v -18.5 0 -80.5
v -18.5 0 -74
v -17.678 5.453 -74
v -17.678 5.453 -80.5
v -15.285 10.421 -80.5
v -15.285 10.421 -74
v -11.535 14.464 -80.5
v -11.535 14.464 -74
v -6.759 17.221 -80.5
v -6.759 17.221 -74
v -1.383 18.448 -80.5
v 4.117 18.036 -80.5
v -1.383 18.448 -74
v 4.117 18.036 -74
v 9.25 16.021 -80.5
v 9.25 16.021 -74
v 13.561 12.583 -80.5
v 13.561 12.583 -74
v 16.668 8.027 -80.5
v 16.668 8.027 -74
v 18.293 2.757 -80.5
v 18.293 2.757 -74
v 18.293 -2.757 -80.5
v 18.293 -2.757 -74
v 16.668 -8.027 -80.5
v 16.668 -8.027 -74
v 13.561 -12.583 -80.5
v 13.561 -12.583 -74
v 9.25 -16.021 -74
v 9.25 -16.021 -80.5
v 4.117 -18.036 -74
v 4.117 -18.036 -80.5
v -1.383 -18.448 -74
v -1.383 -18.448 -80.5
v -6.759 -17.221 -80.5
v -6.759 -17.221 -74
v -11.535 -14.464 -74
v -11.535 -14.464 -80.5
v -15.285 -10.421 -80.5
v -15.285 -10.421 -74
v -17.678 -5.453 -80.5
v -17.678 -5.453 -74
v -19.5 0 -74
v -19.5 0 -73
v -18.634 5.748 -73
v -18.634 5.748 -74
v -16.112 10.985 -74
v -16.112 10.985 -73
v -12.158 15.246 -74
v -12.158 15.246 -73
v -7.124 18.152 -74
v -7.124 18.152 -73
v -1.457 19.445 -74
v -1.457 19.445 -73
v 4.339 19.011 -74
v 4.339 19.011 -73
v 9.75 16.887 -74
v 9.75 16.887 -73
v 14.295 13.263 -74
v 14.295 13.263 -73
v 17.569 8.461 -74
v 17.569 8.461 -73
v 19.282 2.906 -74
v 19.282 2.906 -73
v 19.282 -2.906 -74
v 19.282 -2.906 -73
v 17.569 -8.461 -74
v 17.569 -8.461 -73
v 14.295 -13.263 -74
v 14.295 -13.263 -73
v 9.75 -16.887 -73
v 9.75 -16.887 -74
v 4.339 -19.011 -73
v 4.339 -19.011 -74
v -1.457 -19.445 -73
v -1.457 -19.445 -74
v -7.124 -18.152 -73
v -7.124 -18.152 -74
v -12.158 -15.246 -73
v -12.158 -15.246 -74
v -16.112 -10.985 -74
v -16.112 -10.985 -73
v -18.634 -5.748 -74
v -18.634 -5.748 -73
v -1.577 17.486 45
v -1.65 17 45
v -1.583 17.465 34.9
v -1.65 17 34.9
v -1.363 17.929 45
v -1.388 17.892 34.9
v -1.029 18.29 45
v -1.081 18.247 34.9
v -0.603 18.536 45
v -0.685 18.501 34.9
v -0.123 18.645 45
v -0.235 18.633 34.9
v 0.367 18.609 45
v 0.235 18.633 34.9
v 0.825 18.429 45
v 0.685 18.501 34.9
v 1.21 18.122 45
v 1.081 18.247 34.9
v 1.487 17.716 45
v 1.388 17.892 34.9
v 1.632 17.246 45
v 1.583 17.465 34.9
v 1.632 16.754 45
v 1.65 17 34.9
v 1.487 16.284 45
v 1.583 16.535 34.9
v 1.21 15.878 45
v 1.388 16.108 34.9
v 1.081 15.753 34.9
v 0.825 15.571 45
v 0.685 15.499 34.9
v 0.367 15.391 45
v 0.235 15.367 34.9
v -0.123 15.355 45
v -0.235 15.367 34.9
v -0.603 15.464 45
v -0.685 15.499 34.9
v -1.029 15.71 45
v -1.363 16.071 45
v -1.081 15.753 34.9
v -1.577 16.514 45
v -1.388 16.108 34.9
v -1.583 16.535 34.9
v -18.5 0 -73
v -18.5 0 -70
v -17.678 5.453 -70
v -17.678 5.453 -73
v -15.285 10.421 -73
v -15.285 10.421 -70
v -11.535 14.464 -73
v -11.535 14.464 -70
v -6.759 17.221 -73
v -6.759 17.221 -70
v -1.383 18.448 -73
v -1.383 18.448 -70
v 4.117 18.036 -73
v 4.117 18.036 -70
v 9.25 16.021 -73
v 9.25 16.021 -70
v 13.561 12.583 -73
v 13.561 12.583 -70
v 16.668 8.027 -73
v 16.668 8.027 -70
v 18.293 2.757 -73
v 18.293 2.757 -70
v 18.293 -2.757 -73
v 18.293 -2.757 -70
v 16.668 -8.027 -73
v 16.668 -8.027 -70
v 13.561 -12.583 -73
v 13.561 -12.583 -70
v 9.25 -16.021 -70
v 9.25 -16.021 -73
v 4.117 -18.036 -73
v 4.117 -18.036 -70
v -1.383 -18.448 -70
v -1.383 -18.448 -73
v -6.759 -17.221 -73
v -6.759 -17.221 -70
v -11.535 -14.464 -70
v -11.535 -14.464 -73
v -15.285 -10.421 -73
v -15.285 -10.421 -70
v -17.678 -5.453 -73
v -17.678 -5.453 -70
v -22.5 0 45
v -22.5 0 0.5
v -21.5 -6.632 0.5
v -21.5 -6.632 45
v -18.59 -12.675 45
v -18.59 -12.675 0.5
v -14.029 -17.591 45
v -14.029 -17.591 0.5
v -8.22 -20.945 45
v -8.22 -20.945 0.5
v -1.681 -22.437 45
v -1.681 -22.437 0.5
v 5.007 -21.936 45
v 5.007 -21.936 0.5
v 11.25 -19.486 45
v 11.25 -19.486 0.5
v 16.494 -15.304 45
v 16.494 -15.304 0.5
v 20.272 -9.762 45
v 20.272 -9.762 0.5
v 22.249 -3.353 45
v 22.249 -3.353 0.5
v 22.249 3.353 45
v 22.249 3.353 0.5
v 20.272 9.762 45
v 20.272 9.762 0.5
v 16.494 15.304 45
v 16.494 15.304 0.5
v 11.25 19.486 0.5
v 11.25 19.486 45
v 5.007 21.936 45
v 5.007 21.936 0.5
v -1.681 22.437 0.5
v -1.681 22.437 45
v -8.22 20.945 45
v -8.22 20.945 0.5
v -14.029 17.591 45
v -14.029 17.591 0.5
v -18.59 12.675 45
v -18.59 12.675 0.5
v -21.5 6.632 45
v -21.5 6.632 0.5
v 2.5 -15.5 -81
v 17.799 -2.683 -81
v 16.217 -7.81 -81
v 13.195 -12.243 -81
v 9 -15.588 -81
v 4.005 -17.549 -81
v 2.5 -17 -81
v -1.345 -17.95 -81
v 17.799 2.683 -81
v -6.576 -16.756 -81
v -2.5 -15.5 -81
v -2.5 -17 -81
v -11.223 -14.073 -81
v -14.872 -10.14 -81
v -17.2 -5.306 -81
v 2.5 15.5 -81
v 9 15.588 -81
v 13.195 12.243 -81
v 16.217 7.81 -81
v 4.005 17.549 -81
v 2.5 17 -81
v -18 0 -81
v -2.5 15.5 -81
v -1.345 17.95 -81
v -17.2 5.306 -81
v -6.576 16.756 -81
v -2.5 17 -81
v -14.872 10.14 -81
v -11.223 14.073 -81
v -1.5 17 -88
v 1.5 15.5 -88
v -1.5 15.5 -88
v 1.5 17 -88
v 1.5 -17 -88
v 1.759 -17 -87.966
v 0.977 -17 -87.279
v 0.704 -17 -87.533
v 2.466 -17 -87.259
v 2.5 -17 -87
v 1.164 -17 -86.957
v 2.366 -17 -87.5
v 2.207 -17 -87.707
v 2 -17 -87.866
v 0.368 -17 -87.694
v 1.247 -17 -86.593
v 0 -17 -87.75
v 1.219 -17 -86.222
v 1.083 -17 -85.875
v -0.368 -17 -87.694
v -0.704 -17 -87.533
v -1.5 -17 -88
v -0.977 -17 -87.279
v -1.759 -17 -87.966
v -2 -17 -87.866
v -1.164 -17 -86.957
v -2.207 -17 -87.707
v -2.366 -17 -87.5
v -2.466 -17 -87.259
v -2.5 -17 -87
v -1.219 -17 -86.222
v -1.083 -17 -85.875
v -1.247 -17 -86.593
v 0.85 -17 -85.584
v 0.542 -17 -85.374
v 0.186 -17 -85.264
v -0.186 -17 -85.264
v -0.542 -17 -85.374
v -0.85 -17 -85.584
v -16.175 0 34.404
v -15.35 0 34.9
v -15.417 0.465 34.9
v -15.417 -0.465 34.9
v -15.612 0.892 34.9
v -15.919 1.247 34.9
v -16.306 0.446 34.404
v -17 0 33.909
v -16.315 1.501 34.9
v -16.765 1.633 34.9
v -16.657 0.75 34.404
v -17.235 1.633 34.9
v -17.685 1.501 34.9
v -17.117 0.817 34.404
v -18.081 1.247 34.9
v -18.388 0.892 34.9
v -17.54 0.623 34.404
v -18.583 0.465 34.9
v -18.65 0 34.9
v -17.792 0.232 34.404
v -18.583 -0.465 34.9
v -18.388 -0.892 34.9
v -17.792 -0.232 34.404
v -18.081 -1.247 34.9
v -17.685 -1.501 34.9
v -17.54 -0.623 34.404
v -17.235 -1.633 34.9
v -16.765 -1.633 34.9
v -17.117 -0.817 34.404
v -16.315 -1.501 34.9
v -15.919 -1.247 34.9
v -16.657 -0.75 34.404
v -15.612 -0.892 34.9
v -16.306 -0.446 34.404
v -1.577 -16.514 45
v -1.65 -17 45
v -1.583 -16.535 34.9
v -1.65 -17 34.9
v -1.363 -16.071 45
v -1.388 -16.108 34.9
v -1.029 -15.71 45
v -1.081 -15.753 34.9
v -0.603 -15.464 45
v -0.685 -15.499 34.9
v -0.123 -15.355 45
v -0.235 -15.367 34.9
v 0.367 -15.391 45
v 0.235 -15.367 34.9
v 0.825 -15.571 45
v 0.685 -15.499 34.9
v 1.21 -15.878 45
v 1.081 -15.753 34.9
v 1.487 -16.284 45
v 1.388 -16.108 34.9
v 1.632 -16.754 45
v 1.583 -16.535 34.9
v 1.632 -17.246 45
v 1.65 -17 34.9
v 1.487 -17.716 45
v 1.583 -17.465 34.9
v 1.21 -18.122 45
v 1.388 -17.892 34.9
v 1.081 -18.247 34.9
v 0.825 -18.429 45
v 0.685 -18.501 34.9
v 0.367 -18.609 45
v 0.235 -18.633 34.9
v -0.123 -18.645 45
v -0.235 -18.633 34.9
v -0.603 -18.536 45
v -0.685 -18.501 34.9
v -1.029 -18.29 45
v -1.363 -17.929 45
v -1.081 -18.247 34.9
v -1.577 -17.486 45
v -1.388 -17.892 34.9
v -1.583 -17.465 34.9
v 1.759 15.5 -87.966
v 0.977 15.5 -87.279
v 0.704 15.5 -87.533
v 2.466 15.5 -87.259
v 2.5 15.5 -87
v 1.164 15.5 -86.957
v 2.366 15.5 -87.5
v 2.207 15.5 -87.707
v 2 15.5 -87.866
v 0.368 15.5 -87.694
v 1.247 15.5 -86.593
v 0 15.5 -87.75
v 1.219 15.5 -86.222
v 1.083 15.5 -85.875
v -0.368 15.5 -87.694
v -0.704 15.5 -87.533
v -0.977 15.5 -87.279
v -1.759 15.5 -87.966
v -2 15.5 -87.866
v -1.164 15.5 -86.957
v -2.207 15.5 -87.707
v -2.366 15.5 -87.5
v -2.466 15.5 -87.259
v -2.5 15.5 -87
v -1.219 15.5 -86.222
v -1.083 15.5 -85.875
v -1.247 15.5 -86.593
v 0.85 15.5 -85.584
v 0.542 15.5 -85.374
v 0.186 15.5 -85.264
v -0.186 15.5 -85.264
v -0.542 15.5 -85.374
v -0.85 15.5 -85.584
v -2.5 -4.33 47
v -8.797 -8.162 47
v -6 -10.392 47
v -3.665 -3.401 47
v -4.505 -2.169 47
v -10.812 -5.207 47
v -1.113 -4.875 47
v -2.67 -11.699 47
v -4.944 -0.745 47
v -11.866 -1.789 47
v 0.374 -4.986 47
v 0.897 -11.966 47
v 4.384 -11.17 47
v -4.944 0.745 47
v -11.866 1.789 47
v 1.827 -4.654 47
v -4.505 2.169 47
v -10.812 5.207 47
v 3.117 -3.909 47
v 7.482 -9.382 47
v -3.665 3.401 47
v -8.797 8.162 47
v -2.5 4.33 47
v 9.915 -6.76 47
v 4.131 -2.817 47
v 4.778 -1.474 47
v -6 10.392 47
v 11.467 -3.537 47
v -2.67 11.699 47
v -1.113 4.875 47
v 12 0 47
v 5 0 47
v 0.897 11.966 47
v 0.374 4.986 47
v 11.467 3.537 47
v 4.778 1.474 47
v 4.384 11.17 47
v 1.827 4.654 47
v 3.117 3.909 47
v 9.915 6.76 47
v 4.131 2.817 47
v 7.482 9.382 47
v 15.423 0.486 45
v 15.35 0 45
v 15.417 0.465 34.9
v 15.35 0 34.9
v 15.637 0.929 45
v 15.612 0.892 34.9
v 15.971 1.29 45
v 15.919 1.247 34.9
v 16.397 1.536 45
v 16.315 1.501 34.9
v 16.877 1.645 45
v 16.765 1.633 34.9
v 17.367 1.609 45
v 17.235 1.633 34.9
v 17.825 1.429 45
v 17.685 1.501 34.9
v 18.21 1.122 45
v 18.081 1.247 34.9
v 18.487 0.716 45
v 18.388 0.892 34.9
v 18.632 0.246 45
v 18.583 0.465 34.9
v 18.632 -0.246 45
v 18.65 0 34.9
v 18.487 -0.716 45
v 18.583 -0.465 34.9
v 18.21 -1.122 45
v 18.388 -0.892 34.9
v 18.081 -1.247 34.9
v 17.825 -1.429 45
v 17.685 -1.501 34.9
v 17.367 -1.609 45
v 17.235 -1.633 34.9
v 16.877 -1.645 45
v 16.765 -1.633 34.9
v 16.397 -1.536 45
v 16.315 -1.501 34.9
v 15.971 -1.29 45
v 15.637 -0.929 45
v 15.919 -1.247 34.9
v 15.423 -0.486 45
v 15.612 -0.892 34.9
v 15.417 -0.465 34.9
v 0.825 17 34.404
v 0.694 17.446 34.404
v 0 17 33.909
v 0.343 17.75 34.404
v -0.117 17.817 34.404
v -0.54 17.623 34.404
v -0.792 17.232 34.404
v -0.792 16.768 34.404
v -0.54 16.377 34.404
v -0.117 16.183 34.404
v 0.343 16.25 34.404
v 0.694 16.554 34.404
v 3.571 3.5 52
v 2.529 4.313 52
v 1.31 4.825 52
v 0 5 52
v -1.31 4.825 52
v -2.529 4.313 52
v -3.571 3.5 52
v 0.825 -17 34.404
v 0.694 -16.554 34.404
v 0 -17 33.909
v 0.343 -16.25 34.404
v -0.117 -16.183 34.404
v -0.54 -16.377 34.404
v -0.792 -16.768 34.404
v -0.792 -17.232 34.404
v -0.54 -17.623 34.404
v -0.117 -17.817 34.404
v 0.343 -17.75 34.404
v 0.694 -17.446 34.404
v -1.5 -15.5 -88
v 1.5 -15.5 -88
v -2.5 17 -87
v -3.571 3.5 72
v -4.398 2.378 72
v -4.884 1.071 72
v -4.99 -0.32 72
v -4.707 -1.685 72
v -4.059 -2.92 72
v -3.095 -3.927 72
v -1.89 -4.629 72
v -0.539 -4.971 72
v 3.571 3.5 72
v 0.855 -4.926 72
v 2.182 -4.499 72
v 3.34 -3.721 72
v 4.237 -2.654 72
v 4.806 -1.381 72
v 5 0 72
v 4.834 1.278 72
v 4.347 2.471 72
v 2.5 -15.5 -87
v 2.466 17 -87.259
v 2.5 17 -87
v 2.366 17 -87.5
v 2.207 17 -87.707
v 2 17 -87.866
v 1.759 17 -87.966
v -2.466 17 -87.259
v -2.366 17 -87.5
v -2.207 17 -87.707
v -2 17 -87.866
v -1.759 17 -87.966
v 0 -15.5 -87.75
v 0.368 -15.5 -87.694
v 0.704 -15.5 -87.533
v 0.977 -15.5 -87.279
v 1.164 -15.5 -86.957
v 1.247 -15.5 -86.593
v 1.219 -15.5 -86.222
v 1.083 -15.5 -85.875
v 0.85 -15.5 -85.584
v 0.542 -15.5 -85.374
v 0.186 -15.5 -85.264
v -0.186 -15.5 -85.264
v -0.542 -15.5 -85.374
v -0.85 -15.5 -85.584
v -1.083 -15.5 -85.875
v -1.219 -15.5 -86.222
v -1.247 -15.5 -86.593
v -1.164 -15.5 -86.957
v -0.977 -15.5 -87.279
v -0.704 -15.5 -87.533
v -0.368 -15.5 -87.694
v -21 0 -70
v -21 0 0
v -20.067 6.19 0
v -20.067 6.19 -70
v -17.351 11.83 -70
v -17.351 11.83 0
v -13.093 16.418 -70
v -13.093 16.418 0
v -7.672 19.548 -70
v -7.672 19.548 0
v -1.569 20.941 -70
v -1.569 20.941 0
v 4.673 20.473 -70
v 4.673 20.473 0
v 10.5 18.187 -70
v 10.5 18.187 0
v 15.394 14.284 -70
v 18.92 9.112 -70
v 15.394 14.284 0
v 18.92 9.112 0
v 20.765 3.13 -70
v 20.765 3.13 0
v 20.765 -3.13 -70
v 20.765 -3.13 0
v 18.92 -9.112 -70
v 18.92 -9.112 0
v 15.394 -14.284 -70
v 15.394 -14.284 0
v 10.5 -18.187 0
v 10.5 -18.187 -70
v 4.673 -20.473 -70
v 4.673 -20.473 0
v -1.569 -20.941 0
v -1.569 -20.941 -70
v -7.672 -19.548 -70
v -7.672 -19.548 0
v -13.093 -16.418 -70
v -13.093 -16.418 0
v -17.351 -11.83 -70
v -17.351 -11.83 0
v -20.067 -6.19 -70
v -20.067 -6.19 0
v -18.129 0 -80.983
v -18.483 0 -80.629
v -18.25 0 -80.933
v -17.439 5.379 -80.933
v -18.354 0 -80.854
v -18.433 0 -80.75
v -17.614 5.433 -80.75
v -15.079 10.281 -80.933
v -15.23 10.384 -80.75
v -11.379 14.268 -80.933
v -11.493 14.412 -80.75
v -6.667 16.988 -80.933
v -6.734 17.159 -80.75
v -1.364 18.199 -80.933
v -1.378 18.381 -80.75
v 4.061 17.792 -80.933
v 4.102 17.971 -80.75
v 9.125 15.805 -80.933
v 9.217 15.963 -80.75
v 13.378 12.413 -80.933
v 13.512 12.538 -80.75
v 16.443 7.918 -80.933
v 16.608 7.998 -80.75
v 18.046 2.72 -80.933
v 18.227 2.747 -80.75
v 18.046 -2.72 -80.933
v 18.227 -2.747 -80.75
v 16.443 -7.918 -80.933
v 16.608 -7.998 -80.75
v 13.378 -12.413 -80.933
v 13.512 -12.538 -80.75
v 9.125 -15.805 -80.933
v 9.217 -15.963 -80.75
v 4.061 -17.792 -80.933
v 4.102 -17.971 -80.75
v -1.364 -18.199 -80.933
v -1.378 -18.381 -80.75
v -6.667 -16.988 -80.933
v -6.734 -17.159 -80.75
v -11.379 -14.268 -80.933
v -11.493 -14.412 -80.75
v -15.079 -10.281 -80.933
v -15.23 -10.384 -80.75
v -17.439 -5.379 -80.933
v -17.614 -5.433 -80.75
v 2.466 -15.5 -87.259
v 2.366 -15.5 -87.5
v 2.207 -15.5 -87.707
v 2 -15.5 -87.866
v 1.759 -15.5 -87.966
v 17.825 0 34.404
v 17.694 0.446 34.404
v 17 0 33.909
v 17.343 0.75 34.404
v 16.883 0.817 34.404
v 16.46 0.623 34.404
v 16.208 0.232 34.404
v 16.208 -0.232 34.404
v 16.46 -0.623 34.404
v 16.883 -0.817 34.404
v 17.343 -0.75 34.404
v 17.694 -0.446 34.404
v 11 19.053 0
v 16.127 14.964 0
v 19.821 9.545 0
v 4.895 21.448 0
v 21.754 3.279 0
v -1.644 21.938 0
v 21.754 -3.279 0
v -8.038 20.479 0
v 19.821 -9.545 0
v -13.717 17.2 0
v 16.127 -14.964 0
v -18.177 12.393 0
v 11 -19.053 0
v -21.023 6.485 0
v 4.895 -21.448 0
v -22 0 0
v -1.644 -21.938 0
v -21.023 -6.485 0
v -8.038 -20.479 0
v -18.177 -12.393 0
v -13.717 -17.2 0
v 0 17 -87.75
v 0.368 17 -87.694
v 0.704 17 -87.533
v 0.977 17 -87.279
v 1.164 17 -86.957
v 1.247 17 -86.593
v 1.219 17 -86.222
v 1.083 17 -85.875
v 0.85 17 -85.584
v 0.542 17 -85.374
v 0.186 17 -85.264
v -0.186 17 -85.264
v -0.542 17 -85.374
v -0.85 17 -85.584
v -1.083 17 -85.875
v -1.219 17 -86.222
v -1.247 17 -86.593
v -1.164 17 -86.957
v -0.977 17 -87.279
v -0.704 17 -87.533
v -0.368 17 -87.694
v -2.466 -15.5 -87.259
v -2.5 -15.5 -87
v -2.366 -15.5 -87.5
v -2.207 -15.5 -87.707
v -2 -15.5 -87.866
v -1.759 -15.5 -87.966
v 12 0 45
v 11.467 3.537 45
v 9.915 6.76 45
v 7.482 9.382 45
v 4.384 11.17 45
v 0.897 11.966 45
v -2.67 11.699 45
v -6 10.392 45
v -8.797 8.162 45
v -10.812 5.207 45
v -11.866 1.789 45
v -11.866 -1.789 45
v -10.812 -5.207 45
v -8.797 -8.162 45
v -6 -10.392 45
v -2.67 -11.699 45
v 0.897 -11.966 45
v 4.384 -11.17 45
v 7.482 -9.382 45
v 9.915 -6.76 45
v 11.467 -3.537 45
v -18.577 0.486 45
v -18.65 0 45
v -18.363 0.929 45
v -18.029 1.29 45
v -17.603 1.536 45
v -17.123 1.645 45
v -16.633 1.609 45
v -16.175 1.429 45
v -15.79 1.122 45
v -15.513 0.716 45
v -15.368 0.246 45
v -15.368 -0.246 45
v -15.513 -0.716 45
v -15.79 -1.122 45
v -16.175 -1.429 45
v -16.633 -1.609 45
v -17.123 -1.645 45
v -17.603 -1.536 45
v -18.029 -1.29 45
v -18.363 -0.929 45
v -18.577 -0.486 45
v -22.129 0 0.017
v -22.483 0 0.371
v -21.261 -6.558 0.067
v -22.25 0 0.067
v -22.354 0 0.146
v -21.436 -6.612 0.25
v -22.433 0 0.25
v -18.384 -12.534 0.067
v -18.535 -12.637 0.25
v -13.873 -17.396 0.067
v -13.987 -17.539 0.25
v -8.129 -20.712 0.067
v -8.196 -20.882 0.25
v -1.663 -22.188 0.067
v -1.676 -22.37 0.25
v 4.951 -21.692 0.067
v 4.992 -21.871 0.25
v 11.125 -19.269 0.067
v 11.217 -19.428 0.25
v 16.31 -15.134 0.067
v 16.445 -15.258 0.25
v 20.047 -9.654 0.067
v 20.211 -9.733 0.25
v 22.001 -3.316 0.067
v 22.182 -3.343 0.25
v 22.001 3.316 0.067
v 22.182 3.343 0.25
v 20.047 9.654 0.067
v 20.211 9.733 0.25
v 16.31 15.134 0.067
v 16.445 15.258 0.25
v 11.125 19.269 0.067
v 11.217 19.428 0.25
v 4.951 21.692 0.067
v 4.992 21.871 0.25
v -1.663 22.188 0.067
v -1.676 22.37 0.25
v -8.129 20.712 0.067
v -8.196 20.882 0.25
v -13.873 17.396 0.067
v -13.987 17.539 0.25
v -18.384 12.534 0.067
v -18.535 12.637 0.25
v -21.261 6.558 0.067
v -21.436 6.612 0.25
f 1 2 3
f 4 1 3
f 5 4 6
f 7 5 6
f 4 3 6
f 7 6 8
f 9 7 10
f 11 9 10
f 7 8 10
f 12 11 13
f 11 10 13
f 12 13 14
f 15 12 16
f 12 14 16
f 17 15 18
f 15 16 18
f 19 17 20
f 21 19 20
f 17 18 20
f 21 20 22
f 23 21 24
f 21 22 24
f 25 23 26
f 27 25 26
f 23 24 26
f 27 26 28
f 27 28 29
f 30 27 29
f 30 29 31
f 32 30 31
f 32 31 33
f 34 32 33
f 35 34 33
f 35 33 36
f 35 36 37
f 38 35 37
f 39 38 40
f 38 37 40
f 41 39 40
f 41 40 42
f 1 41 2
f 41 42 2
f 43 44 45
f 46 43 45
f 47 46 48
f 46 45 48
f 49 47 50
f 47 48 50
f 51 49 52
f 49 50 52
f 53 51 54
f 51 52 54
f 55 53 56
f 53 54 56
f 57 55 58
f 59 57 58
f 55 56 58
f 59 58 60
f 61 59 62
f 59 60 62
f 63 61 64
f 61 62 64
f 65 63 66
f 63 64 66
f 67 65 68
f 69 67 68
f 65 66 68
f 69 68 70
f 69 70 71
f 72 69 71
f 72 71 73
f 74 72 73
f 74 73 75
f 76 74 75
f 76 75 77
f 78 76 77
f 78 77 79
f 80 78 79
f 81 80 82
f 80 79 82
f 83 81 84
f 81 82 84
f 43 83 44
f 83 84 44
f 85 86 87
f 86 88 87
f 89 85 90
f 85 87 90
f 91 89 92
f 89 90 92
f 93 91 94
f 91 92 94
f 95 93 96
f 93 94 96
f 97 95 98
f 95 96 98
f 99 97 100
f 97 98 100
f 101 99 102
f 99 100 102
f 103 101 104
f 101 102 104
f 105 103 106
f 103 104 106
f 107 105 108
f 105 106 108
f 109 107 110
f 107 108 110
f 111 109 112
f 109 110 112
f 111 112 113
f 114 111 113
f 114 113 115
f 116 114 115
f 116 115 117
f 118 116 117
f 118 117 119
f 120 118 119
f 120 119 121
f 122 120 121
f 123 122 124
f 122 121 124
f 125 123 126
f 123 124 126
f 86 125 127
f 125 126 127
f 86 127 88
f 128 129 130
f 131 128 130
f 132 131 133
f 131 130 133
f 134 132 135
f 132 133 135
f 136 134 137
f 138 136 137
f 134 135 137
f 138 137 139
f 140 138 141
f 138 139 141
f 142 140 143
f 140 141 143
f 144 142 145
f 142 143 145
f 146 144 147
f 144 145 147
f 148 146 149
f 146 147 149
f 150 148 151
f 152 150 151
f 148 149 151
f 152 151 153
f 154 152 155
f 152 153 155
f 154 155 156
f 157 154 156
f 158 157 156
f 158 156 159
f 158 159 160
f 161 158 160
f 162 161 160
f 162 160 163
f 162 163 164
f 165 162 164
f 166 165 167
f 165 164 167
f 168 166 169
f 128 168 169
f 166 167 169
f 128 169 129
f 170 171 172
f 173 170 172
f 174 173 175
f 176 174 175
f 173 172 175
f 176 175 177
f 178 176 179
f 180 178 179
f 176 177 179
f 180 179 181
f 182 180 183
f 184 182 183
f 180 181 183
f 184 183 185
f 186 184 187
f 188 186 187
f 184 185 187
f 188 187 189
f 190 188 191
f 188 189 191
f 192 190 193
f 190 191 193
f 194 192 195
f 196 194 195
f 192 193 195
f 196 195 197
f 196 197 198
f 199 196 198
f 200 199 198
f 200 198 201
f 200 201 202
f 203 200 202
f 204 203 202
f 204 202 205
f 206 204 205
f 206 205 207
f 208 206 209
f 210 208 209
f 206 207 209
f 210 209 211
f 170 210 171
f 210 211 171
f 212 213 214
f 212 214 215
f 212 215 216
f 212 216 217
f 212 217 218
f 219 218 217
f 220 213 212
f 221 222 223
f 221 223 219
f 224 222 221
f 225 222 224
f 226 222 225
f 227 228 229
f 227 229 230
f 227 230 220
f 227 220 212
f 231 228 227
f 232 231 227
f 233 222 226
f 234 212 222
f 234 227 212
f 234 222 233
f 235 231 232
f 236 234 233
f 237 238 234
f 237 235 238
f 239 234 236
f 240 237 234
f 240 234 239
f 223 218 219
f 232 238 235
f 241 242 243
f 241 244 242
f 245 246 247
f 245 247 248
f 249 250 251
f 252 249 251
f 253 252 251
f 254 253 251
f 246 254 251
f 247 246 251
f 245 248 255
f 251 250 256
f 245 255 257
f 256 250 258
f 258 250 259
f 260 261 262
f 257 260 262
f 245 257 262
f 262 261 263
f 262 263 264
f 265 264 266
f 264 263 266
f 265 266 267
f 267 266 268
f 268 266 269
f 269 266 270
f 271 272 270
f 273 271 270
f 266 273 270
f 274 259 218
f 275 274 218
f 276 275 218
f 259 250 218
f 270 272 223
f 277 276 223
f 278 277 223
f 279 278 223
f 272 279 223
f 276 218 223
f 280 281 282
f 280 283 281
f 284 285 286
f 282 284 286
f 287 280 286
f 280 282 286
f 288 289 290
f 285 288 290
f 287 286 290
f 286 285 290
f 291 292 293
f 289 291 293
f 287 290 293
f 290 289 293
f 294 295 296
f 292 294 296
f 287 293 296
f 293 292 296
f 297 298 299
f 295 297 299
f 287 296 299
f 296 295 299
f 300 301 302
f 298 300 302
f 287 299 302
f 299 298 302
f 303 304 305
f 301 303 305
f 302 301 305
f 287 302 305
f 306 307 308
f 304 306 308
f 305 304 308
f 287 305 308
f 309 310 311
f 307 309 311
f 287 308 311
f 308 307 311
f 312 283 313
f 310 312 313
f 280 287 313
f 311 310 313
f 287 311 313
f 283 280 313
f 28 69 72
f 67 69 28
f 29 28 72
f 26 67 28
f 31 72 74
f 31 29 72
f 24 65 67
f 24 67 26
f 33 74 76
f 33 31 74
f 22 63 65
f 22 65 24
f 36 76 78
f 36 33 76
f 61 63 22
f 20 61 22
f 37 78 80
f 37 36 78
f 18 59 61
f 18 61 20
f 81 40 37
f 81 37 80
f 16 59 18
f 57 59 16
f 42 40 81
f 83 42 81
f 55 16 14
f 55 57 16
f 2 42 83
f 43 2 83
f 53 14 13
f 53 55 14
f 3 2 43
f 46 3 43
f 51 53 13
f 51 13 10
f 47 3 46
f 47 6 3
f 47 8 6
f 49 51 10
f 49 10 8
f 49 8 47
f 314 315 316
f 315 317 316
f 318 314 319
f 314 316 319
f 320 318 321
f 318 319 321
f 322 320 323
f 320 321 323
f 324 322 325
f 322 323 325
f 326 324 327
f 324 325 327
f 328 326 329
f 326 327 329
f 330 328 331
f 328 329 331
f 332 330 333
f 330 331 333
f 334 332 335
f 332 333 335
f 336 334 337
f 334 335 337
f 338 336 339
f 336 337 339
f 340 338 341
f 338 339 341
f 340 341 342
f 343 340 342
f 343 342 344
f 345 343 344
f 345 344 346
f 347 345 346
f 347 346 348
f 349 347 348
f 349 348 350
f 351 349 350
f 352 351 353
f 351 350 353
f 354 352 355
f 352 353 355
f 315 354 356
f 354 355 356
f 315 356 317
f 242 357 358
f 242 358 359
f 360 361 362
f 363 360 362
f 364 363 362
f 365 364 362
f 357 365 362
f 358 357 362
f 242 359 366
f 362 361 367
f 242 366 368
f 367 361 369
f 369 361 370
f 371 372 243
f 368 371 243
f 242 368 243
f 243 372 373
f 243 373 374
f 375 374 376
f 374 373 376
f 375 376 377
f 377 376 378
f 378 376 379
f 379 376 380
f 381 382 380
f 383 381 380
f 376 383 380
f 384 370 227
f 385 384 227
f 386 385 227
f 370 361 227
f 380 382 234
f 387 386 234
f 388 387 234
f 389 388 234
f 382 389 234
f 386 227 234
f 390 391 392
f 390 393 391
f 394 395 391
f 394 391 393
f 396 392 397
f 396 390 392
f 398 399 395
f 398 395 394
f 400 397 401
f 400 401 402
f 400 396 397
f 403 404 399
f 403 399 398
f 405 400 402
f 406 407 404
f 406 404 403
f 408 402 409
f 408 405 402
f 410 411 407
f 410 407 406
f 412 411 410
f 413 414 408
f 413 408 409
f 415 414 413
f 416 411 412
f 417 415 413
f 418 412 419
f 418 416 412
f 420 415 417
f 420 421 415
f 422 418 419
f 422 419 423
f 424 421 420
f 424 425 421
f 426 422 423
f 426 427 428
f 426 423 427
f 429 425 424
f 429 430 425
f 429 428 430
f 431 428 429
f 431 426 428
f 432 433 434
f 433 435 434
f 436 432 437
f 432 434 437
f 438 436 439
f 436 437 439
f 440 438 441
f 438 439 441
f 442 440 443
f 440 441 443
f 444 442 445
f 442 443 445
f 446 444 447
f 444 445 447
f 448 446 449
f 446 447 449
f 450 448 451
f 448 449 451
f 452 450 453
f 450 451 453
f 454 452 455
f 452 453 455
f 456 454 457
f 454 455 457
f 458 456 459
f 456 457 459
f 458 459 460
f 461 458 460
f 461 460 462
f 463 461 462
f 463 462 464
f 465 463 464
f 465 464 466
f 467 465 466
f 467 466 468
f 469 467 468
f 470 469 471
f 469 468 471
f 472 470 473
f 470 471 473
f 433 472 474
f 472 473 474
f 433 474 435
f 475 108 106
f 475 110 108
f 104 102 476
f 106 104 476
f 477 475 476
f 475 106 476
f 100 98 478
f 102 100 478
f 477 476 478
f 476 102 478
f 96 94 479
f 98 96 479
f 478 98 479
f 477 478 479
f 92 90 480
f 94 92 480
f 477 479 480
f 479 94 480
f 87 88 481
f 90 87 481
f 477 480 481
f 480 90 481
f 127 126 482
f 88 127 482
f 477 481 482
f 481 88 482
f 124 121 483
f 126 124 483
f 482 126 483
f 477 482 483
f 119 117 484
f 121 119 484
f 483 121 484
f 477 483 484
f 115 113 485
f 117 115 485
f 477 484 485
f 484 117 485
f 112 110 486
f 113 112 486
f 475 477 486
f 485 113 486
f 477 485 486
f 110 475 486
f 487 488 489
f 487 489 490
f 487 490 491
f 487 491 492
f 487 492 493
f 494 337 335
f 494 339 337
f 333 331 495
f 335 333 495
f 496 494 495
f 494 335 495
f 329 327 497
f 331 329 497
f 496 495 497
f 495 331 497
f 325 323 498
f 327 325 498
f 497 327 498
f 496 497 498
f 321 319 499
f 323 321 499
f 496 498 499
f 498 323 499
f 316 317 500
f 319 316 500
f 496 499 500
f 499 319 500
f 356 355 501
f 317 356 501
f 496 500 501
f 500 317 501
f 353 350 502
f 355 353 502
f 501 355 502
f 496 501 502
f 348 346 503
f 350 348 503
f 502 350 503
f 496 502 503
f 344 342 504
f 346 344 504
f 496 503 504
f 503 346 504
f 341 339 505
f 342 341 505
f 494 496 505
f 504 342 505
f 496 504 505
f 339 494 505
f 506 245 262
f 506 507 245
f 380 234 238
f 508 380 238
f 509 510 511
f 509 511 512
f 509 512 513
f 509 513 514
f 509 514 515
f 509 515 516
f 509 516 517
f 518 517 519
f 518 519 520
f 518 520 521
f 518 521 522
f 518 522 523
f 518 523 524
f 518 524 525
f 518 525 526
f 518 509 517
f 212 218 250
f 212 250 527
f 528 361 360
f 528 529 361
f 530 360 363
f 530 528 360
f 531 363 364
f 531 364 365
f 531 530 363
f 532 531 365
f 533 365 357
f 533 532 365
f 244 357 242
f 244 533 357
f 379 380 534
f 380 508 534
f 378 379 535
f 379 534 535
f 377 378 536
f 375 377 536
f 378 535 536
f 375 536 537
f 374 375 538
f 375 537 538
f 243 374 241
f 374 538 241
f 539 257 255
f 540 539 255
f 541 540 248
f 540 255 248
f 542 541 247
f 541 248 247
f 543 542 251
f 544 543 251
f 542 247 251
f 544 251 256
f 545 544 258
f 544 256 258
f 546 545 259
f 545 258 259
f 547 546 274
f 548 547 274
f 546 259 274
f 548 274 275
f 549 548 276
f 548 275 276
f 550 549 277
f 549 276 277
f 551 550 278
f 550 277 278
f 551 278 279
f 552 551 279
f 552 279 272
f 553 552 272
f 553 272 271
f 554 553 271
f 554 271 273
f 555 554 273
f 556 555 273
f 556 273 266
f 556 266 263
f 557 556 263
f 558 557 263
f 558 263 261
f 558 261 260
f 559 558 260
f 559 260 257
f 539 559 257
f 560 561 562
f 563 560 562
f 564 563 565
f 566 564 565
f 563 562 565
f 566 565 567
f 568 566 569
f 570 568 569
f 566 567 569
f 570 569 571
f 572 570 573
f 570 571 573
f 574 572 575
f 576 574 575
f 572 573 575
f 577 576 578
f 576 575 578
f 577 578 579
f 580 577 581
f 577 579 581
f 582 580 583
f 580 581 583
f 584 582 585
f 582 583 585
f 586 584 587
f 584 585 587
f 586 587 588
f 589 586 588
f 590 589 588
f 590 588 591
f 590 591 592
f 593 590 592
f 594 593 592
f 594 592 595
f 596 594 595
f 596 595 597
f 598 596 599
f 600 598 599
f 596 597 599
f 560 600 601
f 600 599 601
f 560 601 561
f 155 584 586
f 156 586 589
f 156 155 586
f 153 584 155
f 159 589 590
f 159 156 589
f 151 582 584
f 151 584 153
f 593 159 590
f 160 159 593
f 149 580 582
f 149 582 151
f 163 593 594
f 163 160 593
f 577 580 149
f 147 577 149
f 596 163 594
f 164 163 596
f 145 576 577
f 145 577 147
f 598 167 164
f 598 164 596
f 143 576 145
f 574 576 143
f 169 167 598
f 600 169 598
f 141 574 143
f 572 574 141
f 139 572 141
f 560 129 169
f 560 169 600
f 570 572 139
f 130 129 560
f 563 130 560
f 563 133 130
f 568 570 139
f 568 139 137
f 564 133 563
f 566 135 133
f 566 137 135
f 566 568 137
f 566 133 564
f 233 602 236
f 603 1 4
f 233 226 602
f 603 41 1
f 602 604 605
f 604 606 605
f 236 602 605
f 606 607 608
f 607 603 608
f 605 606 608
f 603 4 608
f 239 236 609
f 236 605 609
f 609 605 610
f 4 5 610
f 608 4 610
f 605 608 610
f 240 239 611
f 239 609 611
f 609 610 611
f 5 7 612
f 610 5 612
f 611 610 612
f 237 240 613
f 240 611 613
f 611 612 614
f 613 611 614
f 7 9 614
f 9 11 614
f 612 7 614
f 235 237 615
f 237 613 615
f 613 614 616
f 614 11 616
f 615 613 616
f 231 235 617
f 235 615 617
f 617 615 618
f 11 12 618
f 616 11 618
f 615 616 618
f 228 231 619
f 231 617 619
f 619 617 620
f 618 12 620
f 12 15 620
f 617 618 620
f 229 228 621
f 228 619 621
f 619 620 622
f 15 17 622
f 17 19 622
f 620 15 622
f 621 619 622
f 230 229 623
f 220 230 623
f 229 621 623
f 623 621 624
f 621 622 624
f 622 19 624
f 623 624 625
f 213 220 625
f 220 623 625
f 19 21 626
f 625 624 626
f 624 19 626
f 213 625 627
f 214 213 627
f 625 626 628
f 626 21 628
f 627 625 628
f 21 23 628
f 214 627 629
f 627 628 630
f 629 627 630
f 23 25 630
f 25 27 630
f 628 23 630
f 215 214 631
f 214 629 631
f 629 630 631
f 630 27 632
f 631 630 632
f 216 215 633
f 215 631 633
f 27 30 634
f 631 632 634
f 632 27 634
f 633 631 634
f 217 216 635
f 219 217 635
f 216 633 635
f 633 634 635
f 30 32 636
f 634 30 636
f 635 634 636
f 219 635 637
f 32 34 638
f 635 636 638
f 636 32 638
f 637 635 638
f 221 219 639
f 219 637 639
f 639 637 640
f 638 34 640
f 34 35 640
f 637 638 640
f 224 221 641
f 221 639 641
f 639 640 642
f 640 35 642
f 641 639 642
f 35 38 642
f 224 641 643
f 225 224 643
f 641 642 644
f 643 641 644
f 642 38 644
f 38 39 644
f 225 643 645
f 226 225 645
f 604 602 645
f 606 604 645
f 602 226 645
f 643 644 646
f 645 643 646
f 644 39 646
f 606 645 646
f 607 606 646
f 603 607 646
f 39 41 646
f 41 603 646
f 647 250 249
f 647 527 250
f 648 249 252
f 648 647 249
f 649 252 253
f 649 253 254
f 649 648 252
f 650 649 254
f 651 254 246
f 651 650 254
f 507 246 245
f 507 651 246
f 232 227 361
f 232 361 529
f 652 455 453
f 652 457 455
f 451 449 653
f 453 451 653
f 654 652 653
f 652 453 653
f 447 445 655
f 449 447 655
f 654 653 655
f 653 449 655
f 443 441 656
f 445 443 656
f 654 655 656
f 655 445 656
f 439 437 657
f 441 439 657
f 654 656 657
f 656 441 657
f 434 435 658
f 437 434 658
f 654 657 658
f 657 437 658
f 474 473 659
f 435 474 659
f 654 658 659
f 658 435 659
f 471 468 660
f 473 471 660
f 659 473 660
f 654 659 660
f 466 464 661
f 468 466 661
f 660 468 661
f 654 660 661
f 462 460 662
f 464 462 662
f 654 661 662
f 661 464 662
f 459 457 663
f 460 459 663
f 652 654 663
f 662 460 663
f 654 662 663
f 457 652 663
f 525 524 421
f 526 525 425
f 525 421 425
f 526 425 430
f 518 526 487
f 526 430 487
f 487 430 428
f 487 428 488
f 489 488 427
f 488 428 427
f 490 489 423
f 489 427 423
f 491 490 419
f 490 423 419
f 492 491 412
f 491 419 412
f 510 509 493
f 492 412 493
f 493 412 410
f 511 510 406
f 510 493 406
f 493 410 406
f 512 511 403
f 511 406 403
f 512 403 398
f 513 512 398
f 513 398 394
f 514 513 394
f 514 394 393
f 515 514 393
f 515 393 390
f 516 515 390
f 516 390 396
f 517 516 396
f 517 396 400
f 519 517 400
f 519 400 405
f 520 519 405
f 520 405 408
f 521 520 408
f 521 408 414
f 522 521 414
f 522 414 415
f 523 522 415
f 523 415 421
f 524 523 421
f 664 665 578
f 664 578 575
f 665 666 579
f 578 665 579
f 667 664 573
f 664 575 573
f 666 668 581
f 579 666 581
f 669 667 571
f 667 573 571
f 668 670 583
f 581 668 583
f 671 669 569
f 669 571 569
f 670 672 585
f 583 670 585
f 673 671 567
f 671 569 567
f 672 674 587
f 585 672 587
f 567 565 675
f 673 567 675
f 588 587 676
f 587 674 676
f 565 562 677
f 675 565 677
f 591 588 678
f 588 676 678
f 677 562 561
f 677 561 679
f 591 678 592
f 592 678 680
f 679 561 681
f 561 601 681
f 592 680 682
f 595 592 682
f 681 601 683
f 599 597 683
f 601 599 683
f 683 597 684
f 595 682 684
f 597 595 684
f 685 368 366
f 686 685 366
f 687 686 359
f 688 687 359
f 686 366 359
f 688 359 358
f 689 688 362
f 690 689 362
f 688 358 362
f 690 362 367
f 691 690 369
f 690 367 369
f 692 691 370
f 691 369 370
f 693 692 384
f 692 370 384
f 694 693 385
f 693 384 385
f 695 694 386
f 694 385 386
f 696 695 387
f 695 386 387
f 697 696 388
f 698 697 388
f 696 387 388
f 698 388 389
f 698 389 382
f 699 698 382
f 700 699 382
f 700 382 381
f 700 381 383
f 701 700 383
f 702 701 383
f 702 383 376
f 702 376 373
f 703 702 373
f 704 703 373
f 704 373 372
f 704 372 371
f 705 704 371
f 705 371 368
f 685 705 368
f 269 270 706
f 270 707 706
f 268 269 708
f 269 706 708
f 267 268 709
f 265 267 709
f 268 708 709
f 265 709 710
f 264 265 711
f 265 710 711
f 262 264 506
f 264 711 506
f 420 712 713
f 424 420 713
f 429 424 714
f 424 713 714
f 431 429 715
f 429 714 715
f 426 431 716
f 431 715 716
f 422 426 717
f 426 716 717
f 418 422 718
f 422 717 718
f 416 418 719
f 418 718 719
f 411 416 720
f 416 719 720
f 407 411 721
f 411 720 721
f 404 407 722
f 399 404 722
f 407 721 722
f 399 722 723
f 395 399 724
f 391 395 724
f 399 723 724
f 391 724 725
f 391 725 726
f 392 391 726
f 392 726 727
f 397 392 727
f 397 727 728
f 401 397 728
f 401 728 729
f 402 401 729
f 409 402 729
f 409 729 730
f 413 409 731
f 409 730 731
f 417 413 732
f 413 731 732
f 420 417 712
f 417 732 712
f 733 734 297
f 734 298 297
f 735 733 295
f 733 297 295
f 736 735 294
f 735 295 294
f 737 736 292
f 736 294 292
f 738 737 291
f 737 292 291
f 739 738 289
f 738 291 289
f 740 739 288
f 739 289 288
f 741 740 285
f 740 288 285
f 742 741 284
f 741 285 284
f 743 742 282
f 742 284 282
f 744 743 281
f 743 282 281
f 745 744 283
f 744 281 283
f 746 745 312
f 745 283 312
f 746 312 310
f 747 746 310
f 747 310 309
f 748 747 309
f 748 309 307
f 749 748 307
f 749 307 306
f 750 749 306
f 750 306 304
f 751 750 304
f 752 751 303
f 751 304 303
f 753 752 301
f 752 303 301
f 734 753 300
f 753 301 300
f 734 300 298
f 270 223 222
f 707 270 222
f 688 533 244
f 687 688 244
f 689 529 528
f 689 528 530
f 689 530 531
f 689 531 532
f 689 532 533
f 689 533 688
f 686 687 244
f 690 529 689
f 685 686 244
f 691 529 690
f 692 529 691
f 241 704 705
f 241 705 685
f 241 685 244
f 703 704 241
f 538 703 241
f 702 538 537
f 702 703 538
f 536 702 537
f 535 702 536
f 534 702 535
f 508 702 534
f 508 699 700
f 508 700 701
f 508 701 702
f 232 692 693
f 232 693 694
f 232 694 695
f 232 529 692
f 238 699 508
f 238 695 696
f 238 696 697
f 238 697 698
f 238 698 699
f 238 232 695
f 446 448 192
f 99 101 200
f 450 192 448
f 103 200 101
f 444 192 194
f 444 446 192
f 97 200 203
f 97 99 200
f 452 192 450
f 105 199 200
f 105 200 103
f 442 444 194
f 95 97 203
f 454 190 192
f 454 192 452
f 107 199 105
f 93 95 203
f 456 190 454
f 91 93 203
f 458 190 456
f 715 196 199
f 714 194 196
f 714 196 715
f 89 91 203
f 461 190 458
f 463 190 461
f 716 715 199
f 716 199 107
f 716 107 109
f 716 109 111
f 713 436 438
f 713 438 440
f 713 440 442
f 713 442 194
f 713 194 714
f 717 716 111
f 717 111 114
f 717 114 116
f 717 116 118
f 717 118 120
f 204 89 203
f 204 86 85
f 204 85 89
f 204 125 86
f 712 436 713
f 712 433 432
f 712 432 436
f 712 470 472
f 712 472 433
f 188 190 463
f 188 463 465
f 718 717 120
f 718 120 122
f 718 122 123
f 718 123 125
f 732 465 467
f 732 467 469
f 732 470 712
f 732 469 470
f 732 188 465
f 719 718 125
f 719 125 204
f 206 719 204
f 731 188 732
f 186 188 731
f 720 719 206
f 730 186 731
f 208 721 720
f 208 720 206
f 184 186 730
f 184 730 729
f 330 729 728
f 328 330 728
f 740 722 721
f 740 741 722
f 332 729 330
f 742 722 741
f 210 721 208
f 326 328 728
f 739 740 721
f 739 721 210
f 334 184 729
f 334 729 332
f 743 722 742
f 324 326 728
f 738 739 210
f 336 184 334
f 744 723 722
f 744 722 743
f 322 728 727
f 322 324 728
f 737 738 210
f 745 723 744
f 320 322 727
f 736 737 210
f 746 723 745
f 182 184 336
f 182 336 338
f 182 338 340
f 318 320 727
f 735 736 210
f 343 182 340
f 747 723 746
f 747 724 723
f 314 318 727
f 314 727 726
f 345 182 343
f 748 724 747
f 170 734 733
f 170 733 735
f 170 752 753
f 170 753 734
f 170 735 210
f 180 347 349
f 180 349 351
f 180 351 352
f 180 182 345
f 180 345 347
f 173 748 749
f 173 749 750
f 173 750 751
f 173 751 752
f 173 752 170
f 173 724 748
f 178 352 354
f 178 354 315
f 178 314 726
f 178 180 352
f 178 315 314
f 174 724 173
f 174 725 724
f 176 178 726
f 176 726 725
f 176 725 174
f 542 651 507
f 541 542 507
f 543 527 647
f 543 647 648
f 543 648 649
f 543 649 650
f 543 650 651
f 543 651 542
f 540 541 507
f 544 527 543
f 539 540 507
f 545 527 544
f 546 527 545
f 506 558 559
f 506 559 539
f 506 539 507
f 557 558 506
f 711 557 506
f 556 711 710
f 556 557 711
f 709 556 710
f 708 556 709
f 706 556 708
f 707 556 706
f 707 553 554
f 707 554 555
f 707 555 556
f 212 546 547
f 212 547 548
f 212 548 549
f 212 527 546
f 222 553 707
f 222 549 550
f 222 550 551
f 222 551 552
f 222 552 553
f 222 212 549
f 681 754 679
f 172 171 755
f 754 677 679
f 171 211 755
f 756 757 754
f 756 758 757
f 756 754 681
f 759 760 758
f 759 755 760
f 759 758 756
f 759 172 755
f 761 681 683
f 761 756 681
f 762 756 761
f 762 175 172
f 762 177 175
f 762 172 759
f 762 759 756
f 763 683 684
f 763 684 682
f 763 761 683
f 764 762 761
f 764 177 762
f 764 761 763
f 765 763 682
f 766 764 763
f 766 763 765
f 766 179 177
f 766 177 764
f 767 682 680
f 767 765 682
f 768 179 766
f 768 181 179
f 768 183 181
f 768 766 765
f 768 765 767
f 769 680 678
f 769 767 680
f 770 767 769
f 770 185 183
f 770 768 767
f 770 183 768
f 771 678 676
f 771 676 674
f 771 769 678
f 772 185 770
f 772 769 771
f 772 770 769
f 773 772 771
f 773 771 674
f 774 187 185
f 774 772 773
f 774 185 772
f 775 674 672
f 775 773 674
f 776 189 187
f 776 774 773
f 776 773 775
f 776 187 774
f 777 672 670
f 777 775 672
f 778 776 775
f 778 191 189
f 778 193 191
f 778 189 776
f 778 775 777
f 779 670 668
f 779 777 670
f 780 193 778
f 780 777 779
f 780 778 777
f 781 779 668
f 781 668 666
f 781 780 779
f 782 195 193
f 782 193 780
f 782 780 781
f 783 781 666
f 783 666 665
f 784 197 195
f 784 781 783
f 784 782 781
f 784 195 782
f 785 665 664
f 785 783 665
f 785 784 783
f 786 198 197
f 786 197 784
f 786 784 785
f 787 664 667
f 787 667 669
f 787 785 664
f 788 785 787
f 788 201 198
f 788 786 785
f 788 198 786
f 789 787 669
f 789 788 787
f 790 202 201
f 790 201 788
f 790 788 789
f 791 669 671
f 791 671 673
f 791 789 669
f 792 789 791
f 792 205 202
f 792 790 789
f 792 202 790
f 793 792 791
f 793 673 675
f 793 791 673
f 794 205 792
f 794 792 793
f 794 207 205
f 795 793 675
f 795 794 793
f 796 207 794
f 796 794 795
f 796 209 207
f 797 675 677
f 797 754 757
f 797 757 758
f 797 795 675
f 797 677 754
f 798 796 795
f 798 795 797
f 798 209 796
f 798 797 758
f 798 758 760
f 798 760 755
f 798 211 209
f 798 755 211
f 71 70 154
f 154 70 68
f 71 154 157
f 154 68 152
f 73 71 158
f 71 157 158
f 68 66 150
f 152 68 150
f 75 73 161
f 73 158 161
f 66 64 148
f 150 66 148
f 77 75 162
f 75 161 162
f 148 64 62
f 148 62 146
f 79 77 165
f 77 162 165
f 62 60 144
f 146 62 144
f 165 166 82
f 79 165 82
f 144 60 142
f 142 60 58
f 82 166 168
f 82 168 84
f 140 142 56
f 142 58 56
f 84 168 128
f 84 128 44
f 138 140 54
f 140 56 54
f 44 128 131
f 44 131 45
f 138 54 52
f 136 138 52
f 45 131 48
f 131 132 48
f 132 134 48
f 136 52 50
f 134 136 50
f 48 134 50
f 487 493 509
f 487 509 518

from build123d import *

# Parameters (mm, degrees)
SKETCH2_R             = 22.5
BOSS_EXTRUDE2_DEPTH   = 45
M4_TAPPED_HOLE2_D     = 3.3
M4_TAPPED_HOLE2_DEPTH = 10.1
M4_TAPPED_HOLE2_TIP   = 0.991420021
SKETCH6_R             = 12
BOSS_EXTRUDE3_DEPTH   = 2
SKETCH7_R             = 5
BOSS_EXTRUDE4_DEPTH   = 25
CUT_EXTRUDE1_START    = -20
CUT_EXTRUDE1_DEPTH    = 20
SKETCH9_R             = 21
BOSS_EXTRUDE5_DEPTH   = 70
SKETCH10_R            = 18.5
BOSS_EXTRUDE6_DEPTH   = 3
SKETCH11_R            = 19.5
BOSS_EXTRUDE7_DEPTH   = 1
SKETCH12_R            = 18.5
BOSS_EXTRUDE8_DEPTH   = 7
SKETCH13_W            = 5
SKETCH13_H            = 1.5
BOSS_EXTRUDE9_DEPTH   = 7
SKETCH14_R            = 1.25
CUT_EXTRUDE2_DEPTH    = 100.047968177
FILLET1_R             = 1
FILLET2_R             = 0.5
FILLET3_R             = 0.5


with BuildPart() as part:
    # Sketch2 → Boss-Extrude2 (new body)
    with BuildSketch(Plane.XY):
        with Locations(Location((0, 0, 0), (0, 0, 180))):
            Circle(SKETCH2_R)
    extrude(amount=BOSS_EXTRUDE2_DEPTH)

    # M4 Tapped Hole2
    with Locations(Plane(origin=(0, 17, 45), x_dir=(1, 0, 0), z_dir=(0, 0, 1))):
        with Locations((0, 0), (17, -17), (0, -34), (-17, -17)):
            Hole(M4_TAPPED_HOLE2_D / 2, depth=M4_TAPPED_HOLE2_DEPTH)
            with Locations((0, 0, -(M4_TAPPED_HOLE2_DEPTH + M4_TAPPED_HOLE2_TIP / 2))):  # 118° drill point
                Cone(0, M4_TAPPED_HOLE2_D / 2, M4_TAPPED_HOLE2_TIP, mode=Mode.SUBTRACT)

    # Sketch6 → Boss-Extrude3 (add)
    with BuildSketch(Plane.XY.offset(45)):
        Circle(SKETCH6_R)
    extrude(amount=BOSS_EXTRUDE3_DEPTH)

    # Sketch7 → Boss-Extrude4 (add)
    with BuildSketch(Plane.XY.offset(47)):
        Circle(SKETCH7_R)
    extrude(amount=BOSS_EXTRUDE4_DEPTH)

    # Sketch8 → Cut-Extrude1 (cut)
    with BuildSketch(Plane.XY.offset(72).offset(CUT_EXTRUDE1_START)):
        with BuildLine():
            Line((-3.570714214, 3.5), (3.570714214, 3.5))
            ThreePointArc((3.570714214, 3.5), (0, 5), (-3.570714214, 3.5))
        make_face()
    extrude(amount=CUT_EXTRUDE1_DEPTH, mode=Mode.SUBTRACT)

    # Sketch9 → Boss-Extrude5 (add)
    with BuildSketch(Plane(origin=(0, 0, 0), x_dir=(-1, 0, 0), z_dir=(0, 0, -1))):
        Circle(SKETCH9_R)
    extrude(amount=BOSS_EXTRUDE5_DEPTH)

    # Sketch10 → Boss-Extrude6 (add)
    with BuildSketch(Plane(origin=(0, 0, -70), x_dir=(-1, 0, 0), z_dir=(0, 0, -1))):
        Circle(SKETCH10_R)
    extrude(amount=BOSS_EXTRUDE6_DEPTH)

    # Sketch11 → Boss-Extrude7 (add)
    with BuildSketch(Plane(origin=(0, 0, -73), x_dir=(-1, 0, 0), z_dir=(0, 0, -1))):
        Circle(SKETCH11_R)
    extrude(amount=BOSS_EXTRUDE7_DEPTH)

    # Sketch12 → Boss-Extrude8 (add)
    with BuildSketch(Plane(origin=(0, 0, -74), x_dir=(-1, 0, 0), z_dir=(0, 0, -1))):
        Circle(SKETCH12_R)
    extrude(amount=BOSS_EXTRUDE8_DEPTH)

    # Sketch13 → Boss-Extrude9 (add)
    with BuildSketch(Plane(origin=(0, 0, -81), x_dir=(-1, 0, 0), z_dir=(0, 0, -1))):
        with Locations((0, -16.25)):
            Rectangle(SKETCH13_W, SKETCH13_H)
        with Locations((0, 16.25)):
            Rectangle(SKETCH13_W, SKETCH13_H)
    extrude(amount=BOSS_EXTRUDE9_DEPTH)

    # Sketch14 → Cut-Extrude2 (cut, through all)
    with BuildSketch(Plane.XZ.offset(17)):
        with Locations(Location((0, -86.5, 0), (0, 0, 270))):
            Circle(SKETCH14_R)
    extrude(amount=-CUT_EXTRUDE2_DEPTH, mode=Mode.SUBTRACT)

    # Fillet1
    fillet1_edges = [part.edges().sort_by_distance(p)[0] for p in [
        (2.5, 16.25, -88),
        (-2.5, 16.25, -88),
        (-2.5, -16.25, -88),
        (2.5, -16.25, -88),
    ]]
    fillet(fillet1_edges, radius=FILLET1_R)

    # Fillet2
    fillet2_edges = [part.edges().sort_by_distance(p)[0] for p in [
        (18.5, 0, -81),
    ]]
    fillet(fillet2_edges, radius=FILLET2_R)

    # Fillet3
    fillet3_edges = [part.edges().sort_by_distance(p)[0] for p in [
        (22.5, 0, 0),
    ]]
    fillet(fillet3_edges, radius=FILLET3_R)


solid = part.part
